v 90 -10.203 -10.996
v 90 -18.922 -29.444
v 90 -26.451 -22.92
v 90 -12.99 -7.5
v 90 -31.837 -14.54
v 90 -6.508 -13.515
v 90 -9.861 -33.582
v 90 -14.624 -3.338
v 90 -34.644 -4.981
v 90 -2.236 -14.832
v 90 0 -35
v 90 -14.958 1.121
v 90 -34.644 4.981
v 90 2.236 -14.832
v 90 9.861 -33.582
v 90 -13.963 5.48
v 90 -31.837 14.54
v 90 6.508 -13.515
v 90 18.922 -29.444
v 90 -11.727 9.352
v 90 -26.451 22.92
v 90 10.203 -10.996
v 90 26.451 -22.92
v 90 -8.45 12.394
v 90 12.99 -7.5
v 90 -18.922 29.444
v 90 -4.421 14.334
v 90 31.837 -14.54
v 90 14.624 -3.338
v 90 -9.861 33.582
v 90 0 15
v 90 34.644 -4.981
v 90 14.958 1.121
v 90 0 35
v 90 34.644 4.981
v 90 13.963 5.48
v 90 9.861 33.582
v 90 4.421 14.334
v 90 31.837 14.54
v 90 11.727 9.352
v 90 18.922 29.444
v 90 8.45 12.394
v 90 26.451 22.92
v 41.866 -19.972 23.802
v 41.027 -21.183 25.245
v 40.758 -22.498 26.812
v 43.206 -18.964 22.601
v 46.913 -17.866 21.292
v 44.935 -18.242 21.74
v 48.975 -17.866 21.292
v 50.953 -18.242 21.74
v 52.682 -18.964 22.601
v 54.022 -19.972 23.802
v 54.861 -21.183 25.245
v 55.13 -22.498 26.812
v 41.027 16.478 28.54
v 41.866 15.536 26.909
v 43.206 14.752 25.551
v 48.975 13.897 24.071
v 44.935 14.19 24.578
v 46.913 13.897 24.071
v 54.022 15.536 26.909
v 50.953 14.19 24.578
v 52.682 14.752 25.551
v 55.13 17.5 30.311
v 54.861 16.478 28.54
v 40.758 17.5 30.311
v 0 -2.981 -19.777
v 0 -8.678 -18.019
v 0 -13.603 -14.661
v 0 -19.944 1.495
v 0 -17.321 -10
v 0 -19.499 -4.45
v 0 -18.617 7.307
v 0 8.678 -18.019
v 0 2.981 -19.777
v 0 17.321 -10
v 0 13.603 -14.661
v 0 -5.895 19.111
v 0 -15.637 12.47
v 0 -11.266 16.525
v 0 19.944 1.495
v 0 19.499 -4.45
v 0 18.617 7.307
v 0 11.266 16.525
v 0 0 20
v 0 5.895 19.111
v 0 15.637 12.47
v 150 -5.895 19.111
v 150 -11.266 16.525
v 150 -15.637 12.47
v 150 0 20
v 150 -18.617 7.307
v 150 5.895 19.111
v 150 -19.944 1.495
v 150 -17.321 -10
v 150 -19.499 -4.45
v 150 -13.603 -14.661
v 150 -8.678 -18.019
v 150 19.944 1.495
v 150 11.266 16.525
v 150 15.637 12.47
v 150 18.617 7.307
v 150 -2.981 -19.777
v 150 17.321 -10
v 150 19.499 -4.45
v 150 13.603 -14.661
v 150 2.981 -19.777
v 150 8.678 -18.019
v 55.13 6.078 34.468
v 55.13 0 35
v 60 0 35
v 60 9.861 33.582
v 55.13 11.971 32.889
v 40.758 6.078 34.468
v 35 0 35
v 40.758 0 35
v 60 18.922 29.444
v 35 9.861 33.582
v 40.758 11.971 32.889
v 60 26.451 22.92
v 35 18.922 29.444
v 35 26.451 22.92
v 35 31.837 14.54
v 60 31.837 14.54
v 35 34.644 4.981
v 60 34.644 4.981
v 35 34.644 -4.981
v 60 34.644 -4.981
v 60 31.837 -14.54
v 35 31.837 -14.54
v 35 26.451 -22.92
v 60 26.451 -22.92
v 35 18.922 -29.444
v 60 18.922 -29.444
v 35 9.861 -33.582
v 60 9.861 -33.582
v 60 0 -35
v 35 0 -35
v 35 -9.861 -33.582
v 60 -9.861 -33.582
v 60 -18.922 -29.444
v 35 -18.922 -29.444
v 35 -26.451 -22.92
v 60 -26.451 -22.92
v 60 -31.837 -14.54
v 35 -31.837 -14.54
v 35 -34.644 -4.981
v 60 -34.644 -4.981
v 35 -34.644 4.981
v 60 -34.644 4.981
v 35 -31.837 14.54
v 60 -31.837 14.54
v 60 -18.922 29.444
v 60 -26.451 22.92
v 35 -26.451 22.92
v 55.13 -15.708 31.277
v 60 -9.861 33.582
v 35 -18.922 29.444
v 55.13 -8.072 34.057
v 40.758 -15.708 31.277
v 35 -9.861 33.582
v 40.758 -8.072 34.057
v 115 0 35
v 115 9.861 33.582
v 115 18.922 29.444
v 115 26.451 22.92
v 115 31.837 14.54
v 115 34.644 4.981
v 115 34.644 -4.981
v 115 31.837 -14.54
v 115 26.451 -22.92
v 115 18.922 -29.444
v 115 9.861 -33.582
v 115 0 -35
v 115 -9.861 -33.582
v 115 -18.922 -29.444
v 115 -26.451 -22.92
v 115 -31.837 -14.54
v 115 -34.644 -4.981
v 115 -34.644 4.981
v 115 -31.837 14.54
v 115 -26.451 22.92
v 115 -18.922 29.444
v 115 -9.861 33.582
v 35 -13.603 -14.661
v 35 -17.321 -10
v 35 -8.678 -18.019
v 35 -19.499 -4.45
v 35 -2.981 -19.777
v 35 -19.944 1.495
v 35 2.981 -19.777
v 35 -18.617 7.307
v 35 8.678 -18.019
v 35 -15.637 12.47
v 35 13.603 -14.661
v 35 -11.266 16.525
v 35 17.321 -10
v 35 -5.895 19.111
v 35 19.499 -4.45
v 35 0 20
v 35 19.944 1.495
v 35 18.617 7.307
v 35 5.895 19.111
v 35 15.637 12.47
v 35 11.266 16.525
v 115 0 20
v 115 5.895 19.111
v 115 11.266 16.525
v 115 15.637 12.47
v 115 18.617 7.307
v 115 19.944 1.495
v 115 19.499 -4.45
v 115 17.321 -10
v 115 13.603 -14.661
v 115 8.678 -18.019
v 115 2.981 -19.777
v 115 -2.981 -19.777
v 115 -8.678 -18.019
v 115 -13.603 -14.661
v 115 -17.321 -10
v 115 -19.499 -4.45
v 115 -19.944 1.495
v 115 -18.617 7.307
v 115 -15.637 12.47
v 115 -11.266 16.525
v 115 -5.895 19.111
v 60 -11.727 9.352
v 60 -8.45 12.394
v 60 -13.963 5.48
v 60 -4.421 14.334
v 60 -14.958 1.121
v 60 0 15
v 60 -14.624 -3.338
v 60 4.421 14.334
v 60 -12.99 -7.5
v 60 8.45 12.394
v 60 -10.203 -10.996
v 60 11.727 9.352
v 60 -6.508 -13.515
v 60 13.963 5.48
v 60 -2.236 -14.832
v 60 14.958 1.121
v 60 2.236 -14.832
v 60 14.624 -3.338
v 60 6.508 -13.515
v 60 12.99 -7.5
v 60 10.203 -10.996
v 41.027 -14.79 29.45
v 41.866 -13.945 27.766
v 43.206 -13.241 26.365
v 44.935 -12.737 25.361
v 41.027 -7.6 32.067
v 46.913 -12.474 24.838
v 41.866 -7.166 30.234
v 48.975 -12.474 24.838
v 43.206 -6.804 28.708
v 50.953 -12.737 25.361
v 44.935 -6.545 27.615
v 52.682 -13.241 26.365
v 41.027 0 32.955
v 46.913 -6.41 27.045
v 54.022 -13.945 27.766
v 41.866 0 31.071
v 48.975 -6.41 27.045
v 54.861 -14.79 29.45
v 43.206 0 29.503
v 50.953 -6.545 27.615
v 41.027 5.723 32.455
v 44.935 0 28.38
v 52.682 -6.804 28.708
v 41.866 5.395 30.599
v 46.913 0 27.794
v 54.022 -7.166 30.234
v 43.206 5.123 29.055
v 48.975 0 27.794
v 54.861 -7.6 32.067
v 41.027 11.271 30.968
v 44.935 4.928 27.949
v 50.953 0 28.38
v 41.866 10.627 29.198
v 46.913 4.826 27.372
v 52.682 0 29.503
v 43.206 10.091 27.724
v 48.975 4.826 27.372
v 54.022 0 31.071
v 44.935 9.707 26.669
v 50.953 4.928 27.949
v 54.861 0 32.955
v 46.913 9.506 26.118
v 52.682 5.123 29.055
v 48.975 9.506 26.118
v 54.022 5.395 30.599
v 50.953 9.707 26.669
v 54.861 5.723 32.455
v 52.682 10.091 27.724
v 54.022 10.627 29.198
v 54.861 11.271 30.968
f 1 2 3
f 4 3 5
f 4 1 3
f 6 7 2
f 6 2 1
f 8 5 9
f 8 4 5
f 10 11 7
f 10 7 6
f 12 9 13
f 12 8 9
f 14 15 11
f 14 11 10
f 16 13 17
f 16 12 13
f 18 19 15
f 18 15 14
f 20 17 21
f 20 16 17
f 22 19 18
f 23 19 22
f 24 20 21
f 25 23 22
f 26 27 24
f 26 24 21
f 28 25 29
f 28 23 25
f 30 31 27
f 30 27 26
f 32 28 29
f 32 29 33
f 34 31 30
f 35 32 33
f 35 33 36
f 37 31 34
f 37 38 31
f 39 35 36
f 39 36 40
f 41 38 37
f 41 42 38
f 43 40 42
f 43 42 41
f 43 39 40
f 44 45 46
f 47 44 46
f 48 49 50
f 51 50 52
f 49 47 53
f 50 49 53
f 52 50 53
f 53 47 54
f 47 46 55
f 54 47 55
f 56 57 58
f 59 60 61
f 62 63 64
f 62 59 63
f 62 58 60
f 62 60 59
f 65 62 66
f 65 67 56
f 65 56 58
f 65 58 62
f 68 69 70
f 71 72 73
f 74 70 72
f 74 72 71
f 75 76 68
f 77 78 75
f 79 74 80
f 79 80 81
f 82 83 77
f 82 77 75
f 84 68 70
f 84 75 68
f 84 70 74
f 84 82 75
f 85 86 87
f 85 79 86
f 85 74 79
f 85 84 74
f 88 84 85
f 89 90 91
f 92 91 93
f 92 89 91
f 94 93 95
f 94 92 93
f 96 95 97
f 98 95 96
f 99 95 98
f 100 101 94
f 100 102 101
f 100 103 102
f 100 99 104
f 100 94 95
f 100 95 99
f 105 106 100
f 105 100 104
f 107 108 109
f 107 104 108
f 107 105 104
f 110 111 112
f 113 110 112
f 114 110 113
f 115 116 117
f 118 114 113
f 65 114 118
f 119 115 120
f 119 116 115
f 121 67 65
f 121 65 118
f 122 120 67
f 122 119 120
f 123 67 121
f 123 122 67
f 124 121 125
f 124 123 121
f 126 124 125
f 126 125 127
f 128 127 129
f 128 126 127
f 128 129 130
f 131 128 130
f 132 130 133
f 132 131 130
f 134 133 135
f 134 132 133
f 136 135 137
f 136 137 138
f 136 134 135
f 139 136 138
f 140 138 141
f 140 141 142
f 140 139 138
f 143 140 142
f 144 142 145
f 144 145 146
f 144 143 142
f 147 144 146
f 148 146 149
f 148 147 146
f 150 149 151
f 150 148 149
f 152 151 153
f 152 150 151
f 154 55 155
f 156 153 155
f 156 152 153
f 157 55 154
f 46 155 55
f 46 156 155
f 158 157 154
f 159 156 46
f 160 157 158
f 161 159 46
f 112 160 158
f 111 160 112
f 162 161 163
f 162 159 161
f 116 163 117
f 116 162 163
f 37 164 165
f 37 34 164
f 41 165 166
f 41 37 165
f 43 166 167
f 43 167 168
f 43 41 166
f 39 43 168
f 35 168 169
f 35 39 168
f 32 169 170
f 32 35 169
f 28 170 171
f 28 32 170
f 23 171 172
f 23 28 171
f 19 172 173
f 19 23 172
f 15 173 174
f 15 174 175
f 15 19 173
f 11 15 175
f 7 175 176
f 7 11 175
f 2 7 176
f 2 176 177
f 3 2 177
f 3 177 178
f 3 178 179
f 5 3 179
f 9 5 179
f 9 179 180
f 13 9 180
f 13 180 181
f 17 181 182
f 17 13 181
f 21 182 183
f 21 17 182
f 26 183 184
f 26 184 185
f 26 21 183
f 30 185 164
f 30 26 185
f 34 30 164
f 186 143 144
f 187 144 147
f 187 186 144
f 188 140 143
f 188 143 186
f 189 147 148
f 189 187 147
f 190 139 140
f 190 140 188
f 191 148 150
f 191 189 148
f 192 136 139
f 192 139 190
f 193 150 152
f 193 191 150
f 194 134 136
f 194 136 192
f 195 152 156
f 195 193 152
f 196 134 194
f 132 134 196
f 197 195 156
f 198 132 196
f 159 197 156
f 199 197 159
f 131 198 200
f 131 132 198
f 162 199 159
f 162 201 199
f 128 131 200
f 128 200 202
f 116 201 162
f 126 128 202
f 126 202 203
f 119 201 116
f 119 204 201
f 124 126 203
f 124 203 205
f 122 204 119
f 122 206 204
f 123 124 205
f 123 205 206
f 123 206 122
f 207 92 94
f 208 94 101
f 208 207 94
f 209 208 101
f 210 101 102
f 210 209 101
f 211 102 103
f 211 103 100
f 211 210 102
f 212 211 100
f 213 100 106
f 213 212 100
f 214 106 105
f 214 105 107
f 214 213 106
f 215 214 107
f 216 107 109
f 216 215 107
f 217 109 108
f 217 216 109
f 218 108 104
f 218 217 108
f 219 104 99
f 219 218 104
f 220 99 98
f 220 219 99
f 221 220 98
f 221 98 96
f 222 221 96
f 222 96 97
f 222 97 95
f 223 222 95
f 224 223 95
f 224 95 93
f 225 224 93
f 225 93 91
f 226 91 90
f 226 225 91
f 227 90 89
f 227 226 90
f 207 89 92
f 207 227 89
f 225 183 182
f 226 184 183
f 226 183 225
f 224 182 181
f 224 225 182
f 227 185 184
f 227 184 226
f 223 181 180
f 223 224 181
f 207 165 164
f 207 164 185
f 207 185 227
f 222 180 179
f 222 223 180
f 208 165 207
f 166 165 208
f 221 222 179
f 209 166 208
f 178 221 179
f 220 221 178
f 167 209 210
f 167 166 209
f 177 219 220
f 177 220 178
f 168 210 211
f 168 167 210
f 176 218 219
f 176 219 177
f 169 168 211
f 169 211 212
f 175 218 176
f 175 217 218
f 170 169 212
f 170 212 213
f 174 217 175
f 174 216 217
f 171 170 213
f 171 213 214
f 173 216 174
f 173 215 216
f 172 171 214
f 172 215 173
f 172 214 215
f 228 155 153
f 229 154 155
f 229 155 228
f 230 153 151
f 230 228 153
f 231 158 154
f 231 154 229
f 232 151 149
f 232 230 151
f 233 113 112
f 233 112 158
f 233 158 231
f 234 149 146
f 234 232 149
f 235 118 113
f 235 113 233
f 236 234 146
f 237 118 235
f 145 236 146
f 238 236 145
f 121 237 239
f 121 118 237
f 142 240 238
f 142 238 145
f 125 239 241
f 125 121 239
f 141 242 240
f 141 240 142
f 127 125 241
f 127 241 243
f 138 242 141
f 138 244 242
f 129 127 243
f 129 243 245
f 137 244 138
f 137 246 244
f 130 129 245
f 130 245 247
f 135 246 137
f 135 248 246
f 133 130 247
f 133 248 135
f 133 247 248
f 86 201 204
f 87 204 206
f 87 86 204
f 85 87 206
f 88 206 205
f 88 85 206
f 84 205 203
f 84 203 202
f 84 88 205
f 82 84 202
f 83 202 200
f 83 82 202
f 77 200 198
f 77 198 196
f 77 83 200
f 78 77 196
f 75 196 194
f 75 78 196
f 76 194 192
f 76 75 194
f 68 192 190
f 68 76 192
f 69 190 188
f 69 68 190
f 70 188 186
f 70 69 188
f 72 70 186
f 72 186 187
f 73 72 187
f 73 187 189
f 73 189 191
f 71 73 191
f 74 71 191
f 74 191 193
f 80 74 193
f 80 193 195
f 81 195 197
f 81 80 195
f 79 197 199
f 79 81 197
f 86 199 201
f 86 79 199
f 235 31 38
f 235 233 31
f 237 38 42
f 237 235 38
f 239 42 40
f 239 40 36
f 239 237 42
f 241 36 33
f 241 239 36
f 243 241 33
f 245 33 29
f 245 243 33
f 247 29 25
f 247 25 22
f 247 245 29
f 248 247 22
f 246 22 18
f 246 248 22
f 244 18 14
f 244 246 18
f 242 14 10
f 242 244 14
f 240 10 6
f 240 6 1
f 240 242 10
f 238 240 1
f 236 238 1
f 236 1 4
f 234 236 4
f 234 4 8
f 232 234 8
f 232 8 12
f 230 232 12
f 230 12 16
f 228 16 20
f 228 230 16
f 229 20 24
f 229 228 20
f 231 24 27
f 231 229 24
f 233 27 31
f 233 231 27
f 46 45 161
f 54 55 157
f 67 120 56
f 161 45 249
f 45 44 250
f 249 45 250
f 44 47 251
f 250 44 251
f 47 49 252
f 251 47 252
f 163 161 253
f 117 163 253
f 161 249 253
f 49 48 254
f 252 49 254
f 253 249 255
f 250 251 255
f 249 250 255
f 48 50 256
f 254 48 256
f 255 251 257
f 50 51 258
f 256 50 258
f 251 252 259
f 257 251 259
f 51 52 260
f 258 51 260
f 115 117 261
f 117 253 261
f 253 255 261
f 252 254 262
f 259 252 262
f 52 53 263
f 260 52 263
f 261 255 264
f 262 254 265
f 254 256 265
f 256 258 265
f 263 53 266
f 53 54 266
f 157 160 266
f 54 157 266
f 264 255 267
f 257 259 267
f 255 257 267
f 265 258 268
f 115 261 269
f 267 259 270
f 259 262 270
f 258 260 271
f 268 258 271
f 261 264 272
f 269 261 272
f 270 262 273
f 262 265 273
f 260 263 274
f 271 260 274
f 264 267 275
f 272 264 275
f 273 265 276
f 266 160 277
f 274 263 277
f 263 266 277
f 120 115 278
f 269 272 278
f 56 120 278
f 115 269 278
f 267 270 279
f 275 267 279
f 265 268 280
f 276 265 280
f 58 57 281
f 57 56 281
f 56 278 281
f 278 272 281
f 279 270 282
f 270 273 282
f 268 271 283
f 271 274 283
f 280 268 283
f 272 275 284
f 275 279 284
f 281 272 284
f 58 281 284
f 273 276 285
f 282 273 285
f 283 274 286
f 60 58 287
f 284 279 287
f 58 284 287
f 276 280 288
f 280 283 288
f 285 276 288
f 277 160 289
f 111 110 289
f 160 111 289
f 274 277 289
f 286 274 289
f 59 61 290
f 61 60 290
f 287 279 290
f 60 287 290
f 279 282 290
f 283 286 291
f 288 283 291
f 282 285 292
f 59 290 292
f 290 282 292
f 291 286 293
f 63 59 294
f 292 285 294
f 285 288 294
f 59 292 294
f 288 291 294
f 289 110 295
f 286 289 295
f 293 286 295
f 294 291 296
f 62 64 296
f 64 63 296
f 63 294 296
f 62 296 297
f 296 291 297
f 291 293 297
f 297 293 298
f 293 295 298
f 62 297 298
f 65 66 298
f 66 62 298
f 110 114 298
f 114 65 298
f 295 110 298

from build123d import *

# Parameters (mm, degrees)
F2_R          = 7.186555345
F3_ANGLE_BACK = 40
F3_ANGLE      = 70


with BuildPart() as f1:
    # F0 (on Front) → F1 (revolve)
    with BuildSketch(Plane.XZ):
        Polygon((0, 20), (0, 0), (150, 0), (150, 20), (115, 20), (115, 35), (90, 35), (90, 15), (60, 15), (60, 35), (35, 35), (35, 20), align=None)
    revolve(axis=Axis((75, 0, 0), (-1, 0, 0)))

    # F2 (on Front) → F3 (revolve, cut)
    with BuildSketch(Plane.XZ, mode=Mode.PRIVATE) as f3_sk:
        with Locations((47.9439608753, 34.906566143)):
            Circle(F2_R)
    revolve(f3_sk.sketch.rotate(Axis((83.0608084798, 0, 0), (-1, 0, 0)), -F3_ANGLE_BACK), axis=Axis((83.0608084798, 0, 0), (-1, 0, 0)), revolution_arc=F3_ANGLE, mode=Mode.SUBTRACT)


solid = f1.part
